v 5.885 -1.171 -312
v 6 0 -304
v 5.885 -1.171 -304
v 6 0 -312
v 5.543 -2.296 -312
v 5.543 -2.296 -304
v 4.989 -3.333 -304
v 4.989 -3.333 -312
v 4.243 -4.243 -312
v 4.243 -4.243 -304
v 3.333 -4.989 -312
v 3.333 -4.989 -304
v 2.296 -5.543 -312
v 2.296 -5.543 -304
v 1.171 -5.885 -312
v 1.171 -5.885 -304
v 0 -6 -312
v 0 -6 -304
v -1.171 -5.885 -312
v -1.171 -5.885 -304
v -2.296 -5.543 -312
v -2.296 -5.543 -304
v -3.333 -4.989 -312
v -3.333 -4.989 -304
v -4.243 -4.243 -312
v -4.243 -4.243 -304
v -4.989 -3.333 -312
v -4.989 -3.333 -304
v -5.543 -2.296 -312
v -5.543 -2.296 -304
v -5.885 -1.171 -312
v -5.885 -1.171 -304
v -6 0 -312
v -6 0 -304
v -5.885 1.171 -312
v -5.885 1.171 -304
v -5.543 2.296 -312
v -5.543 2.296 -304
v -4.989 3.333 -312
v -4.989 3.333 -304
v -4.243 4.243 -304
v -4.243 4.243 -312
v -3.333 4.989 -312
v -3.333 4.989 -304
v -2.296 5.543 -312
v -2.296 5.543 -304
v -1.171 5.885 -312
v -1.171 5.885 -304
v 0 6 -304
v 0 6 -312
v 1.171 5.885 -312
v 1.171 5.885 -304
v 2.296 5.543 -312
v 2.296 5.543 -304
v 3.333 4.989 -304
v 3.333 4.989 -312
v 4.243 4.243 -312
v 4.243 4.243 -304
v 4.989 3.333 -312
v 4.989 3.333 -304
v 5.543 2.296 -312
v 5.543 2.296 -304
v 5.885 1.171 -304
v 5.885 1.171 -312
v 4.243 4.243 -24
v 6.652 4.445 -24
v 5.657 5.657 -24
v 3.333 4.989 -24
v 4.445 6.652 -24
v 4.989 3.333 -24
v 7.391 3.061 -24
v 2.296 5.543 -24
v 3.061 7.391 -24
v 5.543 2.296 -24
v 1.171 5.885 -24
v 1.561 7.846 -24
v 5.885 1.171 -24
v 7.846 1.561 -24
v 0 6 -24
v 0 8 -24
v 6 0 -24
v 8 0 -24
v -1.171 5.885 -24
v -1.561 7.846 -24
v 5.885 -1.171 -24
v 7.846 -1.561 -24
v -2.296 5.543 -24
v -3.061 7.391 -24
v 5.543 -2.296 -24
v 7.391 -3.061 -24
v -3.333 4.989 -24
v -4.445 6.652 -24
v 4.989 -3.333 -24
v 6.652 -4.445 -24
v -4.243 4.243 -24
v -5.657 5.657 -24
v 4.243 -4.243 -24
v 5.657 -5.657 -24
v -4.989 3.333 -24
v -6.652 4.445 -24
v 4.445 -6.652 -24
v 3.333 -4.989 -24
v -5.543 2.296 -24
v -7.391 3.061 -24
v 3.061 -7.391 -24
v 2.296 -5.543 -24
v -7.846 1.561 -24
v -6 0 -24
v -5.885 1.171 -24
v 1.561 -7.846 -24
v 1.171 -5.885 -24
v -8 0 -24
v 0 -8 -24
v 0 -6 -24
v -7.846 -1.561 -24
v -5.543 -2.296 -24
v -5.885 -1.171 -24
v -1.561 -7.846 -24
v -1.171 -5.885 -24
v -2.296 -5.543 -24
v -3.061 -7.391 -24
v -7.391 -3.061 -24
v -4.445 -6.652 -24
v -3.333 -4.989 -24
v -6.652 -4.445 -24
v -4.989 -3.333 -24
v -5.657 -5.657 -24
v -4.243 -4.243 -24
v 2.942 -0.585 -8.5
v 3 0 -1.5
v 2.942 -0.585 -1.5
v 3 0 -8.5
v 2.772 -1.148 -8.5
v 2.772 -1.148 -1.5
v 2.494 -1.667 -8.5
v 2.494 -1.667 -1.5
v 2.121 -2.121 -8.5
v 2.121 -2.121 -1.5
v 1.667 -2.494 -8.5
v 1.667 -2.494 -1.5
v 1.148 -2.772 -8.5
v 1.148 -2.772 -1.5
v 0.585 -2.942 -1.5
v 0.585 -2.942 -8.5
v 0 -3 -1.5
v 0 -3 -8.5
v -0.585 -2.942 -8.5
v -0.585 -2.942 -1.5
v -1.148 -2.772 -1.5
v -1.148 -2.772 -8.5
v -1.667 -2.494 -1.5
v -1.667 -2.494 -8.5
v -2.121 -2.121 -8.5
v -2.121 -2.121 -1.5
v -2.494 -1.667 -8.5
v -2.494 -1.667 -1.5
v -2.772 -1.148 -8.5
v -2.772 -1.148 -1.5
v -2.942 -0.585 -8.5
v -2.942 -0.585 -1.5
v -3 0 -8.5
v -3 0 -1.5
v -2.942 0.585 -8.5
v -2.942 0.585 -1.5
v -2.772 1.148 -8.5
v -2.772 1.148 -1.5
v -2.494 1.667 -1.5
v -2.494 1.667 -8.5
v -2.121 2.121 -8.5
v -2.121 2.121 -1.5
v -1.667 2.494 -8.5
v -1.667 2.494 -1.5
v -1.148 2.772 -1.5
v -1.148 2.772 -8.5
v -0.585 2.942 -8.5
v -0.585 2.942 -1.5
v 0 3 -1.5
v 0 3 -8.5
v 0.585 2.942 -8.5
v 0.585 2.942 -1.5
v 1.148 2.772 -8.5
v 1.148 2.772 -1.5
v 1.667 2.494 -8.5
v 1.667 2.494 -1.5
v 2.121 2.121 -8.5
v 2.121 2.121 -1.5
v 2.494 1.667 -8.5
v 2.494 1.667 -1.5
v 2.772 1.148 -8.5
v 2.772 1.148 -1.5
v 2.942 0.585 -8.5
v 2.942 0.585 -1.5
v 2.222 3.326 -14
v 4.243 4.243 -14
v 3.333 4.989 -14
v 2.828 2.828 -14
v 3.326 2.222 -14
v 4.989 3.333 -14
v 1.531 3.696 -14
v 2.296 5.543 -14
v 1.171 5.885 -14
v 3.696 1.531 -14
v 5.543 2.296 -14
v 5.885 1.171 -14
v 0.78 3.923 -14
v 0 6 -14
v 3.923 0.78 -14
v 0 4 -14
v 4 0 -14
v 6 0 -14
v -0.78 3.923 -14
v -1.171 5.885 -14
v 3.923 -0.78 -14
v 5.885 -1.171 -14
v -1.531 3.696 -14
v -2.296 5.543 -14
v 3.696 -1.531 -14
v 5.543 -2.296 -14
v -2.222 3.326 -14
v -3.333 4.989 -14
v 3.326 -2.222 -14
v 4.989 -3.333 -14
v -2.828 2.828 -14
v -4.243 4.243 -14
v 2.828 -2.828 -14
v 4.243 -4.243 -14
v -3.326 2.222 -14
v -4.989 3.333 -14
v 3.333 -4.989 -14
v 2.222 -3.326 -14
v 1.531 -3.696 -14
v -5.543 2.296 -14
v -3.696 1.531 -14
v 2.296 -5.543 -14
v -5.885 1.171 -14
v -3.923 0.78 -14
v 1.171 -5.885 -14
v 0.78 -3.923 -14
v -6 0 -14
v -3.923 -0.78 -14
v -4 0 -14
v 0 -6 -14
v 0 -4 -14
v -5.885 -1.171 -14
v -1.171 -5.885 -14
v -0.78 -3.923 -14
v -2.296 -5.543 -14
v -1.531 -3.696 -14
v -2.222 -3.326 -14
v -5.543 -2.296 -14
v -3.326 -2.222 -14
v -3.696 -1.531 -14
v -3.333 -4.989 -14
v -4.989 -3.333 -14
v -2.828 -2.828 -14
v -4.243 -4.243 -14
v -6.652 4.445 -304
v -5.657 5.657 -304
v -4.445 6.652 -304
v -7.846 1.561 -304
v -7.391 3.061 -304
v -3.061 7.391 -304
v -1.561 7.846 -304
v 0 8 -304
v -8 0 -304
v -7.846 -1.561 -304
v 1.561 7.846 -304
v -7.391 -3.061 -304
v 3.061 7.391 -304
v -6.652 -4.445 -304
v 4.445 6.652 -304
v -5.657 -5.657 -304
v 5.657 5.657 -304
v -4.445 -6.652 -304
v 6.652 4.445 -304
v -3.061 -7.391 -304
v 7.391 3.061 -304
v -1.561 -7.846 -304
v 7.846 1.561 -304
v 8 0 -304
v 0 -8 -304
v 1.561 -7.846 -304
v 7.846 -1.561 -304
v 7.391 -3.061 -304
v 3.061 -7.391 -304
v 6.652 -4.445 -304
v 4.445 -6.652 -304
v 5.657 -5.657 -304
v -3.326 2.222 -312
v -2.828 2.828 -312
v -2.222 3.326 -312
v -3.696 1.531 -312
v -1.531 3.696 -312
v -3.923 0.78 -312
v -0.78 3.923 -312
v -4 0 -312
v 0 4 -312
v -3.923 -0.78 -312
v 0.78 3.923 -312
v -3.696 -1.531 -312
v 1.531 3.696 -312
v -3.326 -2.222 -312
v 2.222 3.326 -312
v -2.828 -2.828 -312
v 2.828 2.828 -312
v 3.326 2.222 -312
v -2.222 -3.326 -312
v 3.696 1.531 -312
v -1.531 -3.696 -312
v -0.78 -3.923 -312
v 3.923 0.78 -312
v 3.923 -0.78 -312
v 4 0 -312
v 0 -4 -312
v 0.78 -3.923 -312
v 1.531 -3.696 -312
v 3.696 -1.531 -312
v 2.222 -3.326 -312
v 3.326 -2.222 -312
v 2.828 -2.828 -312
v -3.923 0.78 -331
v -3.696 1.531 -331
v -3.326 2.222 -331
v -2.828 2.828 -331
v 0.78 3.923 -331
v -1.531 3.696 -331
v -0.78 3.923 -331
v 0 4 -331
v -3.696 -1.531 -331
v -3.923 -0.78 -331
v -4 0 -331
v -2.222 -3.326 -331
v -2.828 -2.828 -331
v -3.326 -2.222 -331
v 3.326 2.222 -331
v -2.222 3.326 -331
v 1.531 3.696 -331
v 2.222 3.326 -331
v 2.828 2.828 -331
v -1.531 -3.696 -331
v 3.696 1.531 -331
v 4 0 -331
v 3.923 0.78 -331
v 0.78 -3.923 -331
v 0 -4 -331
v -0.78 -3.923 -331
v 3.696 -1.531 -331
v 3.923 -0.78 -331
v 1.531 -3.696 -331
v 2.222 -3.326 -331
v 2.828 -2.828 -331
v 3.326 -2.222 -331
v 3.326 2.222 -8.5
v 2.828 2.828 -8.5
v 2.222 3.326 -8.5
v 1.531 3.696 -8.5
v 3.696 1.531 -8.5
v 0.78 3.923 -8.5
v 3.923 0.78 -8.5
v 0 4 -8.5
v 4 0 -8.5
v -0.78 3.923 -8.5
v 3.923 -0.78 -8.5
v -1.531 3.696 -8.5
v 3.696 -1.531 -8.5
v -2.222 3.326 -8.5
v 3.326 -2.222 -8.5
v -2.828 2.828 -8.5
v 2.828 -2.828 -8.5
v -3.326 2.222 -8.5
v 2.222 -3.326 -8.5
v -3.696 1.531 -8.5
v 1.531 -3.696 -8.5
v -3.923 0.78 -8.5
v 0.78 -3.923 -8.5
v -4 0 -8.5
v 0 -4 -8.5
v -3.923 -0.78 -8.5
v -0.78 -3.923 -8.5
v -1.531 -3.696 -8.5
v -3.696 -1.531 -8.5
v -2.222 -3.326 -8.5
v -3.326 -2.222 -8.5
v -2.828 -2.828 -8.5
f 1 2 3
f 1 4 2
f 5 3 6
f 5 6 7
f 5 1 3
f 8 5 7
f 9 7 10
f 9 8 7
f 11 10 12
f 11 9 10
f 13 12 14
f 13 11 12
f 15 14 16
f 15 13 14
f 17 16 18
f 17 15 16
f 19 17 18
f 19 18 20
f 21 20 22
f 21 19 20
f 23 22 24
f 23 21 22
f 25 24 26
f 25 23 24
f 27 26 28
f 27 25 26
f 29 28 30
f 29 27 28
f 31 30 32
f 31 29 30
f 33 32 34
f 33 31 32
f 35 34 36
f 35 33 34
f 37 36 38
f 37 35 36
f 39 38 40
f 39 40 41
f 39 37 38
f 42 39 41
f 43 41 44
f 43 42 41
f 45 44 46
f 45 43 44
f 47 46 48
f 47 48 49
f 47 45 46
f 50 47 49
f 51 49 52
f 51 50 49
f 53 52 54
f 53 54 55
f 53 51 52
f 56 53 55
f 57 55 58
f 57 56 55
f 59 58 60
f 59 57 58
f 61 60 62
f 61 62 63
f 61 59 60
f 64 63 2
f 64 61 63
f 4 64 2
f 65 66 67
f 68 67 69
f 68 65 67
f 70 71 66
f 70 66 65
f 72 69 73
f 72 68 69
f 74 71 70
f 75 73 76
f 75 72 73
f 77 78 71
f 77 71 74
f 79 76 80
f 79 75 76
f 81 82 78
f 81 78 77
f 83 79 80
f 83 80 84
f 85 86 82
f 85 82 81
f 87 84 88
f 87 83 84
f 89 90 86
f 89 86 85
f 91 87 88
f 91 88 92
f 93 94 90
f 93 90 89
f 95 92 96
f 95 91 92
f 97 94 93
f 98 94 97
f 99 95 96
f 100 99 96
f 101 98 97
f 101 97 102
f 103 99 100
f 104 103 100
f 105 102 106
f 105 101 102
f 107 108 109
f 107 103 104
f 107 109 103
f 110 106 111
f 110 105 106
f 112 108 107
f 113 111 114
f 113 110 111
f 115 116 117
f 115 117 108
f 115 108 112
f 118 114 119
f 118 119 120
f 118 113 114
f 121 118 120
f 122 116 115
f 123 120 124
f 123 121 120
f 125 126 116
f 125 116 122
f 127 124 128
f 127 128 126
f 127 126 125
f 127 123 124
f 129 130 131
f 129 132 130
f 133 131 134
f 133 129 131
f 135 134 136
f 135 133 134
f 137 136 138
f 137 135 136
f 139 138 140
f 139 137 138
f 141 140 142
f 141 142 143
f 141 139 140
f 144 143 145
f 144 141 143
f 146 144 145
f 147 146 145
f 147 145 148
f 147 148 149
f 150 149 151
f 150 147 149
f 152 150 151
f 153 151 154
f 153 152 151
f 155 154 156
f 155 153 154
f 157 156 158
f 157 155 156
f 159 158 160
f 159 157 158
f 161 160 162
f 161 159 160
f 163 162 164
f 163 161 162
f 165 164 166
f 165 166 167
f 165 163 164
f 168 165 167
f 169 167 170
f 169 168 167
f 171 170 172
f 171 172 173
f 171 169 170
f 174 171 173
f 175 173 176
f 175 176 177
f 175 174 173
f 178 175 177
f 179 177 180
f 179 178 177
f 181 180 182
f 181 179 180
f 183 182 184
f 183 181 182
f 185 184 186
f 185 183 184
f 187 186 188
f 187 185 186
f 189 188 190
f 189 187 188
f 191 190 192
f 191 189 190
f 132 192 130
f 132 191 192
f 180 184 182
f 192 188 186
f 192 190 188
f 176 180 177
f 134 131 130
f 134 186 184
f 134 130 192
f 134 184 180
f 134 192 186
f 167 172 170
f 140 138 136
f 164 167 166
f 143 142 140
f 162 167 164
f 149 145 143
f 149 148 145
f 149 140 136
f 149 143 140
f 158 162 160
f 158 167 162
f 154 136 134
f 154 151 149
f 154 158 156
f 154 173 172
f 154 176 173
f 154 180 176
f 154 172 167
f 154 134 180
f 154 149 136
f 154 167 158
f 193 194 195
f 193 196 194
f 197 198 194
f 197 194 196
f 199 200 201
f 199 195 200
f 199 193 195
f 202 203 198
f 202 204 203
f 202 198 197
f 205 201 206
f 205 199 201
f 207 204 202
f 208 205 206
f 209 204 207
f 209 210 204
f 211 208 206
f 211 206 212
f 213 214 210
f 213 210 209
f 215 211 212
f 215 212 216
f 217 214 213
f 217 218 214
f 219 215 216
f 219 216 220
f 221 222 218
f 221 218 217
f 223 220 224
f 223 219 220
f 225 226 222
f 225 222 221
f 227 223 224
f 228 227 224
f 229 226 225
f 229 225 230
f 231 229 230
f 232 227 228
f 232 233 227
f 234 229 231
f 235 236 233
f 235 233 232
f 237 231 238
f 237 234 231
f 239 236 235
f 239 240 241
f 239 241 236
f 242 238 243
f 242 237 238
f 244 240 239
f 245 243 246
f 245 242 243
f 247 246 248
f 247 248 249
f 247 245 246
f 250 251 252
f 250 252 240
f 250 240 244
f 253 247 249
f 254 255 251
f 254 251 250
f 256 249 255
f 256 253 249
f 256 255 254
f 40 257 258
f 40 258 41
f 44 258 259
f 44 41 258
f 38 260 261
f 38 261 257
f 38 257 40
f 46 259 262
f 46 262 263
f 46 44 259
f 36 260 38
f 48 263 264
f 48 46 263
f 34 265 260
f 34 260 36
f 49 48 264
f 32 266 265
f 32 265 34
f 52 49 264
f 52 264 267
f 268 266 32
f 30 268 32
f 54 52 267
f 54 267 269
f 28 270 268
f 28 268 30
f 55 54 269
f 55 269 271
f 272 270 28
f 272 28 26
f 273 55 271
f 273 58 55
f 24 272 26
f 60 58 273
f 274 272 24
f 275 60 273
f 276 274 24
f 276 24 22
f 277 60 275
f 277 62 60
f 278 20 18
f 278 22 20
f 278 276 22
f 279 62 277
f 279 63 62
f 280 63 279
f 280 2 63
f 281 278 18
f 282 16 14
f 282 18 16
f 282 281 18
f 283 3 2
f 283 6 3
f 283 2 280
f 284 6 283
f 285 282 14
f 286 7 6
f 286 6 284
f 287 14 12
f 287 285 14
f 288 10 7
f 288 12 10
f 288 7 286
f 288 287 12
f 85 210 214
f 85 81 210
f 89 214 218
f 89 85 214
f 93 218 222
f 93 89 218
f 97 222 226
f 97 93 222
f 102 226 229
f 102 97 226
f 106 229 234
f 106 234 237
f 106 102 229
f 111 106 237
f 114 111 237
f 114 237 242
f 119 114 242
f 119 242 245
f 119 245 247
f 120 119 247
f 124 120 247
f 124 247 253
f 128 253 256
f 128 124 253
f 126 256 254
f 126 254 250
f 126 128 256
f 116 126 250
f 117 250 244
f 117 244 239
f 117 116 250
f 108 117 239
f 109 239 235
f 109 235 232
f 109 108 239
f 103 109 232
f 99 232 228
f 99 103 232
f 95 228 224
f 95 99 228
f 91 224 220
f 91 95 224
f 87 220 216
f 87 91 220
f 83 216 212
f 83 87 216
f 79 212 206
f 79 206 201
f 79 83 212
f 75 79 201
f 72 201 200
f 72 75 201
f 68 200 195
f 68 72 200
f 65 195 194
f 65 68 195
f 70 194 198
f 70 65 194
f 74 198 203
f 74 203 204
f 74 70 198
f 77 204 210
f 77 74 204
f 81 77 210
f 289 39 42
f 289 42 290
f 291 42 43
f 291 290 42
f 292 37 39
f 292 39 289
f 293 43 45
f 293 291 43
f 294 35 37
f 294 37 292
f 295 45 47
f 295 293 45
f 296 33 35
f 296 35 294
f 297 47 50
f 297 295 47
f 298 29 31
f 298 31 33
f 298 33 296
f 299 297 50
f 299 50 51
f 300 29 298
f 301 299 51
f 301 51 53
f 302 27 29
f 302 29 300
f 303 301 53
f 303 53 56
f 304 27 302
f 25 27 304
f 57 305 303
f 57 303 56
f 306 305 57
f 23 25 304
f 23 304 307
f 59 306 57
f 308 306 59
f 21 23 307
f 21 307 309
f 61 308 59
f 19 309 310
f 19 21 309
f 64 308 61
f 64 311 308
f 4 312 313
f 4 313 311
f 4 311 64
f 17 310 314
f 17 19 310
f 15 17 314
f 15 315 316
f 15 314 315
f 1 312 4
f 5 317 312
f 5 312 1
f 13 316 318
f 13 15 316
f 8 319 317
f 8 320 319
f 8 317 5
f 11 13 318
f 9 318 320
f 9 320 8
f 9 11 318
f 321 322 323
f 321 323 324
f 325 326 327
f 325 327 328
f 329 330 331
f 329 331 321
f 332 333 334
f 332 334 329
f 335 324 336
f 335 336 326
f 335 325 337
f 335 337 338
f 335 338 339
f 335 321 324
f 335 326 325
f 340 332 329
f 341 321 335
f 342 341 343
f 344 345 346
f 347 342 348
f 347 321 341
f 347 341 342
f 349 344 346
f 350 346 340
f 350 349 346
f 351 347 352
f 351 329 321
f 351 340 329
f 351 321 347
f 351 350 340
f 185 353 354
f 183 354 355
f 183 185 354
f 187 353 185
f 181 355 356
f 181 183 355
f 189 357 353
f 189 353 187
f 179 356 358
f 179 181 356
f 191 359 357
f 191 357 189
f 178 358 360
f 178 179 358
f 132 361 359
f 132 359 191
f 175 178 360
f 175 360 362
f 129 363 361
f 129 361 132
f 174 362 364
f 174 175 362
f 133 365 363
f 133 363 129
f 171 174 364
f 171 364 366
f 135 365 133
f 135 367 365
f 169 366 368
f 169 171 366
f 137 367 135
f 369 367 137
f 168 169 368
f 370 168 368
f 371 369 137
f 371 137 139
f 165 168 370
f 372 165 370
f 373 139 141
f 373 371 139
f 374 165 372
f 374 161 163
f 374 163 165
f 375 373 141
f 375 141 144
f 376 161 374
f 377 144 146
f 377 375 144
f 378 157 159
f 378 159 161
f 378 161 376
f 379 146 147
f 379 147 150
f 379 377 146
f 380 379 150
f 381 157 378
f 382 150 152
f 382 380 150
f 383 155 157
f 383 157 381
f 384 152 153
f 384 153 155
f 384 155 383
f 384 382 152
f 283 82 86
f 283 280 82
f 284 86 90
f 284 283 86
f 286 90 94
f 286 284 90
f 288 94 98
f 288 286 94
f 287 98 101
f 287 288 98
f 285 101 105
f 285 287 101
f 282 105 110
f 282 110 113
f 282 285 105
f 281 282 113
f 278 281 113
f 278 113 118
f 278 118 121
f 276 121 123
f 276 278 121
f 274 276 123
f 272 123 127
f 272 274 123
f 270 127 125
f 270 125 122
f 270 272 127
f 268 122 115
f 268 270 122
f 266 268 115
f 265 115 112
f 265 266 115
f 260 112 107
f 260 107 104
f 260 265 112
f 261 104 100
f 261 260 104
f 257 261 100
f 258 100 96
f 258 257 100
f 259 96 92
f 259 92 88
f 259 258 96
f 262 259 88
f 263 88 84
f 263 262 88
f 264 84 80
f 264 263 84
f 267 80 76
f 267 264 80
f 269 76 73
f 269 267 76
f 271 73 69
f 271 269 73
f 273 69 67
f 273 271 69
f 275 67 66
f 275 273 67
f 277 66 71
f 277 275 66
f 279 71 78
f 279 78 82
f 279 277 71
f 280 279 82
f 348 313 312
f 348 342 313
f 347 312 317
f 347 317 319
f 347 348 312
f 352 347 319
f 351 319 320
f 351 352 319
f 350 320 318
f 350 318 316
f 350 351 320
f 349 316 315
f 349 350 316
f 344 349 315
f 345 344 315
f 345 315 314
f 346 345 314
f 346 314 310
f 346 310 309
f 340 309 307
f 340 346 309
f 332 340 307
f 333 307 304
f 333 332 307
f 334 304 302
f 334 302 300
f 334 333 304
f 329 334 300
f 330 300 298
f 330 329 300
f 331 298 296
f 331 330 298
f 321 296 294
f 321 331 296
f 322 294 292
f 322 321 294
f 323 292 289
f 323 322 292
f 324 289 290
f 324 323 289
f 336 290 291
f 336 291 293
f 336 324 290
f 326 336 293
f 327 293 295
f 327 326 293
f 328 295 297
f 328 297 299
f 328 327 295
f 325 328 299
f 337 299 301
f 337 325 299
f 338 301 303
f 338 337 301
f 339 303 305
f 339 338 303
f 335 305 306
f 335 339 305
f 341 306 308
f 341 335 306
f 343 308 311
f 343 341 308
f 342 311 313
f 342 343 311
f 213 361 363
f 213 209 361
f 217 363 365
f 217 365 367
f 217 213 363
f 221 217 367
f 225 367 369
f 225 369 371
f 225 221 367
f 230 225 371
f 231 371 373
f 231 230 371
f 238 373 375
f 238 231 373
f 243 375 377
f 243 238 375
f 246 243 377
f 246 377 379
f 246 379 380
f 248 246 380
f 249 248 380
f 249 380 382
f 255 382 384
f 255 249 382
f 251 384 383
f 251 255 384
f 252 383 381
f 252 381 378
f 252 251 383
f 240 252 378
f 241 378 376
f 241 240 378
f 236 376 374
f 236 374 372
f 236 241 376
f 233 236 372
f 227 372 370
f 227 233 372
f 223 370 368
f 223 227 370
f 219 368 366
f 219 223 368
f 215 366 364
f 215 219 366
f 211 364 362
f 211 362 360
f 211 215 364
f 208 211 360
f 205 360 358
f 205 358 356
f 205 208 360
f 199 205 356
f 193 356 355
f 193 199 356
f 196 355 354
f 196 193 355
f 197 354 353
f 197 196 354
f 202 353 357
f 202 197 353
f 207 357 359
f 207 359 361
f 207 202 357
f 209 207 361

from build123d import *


with BuildPart() as part:
    # Schizzo2 → Rivoluzione2 (revolve)
    with BuildSketch(Plane(origin=(0, 0, 0), x_dir=(0, 0, -1), z_dir=(1, 0, 0)), mode=Mode.PRIVATE) as rivoluzione2_sk:
        Polygon((1.5, 0), (1.5, 3), (8.5, 3), (8.5, 4), (14, 4), (14, 6), (24, 6), (24, 8), (304, 8), (304, 6), (312, 6), (312, 4), (331, 4), (331, 0), align=None)
    revolve(rivoluzione2_sk.sketch.rotate(Axis((0, 0, 0), (0, 0, -1)), 90), axis=Axis((0, 0, 0), (0, 0, -1)))


solid = part.part
